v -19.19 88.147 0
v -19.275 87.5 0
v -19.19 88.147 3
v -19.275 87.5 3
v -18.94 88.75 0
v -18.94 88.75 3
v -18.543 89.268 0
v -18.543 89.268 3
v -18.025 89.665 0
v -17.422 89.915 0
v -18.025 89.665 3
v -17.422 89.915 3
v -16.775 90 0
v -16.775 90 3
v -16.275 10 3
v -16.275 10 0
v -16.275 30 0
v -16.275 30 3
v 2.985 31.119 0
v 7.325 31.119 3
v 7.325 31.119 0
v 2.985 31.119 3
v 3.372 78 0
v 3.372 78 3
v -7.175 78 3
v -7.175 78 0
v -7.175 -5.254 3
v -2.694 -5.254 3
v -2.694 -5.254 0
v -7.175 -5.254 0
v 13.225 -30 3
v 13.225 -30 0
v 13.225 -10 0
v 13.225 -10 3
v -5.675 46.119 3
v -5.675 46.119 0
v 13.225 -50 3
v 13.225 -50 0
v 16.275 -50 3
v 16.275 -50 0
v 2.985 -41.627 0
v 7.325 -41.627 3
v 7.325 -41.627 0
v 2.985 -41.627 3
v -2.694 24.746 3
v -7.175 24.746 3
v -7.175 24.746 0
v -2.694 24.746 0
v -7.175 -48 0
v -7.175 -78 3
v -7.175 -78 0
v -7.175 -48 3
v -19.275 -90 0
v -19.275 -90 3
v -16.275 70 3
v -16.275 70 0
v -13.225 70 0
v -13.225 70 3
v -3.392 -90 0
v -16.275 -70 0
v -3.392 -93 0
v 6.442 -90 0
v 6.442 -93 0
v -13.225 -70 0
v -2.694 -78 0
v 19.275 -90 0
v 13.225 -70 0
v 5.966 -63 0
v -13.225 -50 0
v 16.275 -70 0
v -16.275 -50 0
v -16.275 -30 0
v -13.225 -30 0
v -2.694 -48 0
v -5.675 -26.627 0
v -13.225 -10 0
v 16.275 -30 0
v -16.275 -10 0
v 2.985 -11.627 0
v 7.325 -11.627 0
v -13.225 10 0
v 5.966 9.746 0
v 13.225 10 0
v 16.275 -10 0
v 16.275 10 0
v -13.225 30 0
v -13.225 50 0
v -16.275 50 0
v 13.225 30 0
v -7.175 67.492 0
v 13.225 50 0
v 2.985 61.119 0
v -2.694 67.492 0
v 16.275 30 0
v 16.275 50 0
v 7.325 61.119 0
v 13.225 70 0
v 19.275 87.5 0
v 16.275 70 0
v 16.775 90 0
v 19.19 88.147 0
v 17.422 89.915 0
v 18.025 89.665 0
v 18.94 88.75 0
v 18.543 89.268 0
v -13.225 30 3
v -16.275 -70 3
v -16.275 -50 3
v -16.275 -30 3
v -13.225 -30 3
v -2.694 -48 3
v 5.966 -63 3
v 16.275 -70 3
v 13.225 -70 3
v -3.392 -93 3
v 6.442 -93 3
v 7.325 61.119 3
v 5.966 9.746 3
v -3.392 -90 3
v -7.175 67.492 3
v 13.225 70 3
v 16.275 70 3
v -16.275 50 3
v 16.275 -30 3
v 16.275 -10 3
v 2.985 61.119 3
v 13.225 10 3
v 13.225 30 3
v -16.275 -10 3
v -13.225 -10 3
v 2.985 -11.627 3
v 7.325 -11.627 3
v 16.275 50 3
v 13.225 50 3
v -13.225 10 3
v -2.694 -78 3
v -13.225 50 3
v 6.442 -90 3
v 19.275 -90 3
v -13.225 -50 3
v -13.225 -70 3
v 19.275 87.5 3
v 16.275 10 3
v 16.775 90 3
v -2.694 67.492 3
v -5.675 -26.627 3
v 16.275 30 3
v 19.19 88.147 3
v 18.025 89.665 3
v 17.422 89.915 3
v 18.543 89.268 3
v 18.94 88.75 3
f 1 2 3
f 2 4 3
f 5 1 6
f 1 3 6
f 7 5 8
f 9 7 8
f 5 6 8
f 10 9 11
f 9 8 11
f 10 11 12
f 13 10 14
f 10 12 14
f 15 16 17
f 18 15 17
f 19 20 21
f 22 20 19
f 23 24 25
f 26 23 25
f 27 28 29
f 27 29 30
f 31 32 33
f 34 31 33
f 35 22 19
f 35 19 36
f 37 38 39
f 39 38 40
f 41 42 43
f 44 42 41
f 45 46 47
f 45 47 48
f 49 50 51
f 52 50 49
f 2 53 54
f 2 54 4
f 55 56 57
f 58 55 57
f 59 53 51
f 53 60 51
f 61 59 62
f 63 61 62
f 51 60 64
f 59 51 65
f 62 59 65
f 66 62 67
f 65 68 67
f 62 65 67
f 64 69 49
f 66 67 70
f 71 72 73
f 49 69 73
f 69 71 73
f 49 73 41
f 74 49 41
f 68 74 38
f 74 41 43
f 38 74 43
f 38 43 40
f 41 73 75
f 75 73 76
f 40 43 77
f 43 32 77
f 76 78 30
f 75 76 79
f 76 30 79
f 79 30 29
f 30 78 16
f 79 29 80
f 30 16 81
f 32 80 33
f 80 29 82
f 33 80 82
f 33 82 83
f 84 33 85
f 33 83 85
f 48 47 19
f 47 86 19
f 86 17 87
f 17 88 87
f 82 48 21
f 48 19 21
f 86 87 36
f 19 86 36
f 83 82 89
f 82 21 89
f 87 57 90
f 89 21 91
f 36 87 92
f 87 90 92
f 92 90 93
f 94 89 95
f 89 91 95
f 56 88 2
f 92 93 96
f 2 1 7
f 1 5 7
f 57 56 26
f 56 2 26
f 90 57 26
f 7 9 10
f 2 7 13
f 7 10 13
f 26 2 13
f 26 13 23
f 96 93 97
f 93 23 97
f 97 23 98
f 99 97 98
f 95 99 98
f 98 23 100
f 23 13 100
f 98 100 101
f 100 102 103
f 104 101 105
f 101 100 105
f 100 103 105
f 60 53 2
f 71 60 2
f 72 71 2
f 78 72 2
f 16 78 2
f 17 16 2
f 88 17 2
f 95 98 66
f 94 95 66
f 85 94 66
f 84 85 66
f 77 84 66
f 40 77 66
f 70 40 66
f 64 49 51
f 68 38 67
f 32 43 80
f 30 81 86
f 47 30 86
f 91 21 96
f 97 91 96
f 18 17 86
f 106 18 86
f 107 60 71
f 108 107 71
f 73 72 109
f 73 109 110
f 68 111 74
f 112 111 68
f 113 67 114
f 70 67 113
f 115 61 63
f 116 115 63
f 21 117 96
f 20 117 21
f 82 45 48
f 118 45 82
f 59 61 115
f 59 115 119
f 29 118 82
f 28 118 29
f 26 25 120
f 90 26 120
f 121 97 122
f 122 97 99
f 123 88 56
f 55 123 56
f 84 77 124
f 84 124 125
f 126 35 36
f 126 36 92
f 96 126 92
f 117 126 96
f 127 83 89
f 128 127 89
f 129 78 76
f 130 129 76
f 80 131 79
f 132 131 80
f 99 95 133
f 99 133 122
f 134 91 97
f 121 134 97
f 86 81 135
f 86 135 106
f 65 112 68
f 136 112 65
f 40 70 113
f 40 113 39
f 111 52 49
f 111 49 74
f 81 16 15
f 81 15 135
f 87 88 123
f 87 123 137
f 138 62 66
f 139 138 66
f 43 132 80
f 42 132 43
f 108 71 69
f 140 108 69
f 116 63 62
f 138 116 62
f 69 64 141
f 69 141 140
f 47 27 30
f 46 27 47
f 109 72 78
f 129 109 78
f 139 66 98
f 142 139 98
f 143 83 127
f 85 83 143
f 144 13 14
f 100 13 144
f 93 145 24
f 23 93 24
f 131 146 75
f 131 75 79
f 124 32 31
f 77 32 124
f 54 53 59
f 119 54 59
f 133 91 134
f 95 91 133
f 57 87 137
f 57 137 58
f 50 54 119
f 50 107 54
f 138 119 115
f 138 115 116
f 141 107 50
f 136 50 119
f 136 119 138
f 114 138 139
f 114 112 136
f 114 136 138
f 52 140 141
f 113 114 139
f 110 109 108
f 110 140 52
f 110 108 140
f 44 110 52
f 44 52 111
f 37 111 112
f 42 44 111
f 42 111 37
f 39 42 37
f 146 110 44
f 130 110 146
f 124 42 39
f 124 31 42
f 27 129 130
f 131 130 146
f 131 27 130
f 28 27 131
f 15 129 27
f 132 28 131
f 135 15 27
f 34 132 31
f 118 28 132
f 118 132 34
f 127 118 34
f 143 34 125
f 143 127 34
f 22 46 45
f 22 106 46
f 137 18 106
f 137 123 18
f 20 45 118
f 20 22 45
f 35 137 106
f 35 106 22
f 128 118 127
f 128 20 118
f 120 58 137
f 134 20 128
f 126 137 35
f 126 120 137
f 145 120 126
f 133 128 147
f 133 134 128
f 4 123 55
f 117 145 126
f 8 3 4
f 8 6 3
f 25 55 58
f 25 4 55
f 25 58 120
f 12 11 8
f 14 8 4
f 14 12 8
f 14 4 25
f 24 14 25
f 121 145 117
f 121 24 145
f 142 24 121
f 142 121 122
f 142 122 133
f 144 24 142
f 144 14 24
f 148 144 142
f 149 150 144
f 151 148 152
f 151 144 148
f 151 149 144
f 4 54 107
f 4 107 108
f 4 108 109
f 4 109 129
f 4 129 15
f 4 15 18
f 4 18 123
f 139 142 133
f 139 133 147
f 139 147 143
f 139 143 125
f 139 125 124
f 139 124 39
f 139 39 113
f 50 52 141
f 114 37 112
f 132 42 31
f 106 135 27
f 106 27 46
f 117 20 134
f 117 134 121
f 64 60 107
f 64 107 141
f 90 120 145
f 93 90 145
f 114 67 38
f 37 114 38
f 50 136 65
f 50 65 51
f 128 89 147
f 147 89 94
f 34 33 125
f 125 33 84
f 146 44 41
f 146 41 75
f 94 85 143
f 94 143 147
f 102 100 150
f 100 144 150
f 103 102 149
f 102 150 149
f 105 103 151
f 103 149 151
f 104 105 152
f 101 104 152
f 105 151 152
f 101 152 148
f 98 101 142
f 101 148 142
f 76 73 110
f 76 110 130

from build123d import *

# Parameters (mm, degrees)
SKETCH1_W               = 38.55
SKETCH1_H               = 180
SKETCH1_W_2             = 3.05
SKETCH1_H_2             = 20
SKETCH1_W_3             = 9.833333334
SKETCH1_H_3             = 3
BOSS_EXTRUDE1_DEPTH     = 3
CUT_EXTRUDE4_DEPTH      = 1
CUT_EXTRUDE4_DEPTH_BACK = 4
FILLET1_R               = 2.5


with BuildPart() as part:
    # Sketch1 → Boss-Extrude1 (new body)
    with BuildSketch(Plane.XY):
        Rectangle(SKETCH1_W, SKETCH1_H)
        with Locations((14.75, -20)):
            Rectangle(SKETCH1_W_2, SKETCH1_H_2, mode=Mode.SUBTRACT)
        with Locations((14.75, 20)):
            Rectangle(SKETCH1_W_2, SKETCH1_H_2, mode=Mode.SUBTRACT)
        with Locations((14.75, 60)):
            Rectangle(SKETCH1_W_2, SKETCH1_H_2, mode=Mode.SUBTRACT)
        with Locations((14.75, -60)):
            Rectangle(SKETCH1_W_2, SKETCH1_H_2, mode=Mode.SUBTRACT)
        with Locations((-14.75, 60)):
            Rectangle(SKETCH1_W_2, SKETCH1_H_2, mode=Mode.SUBTRACT)
        with Locations((-14.75, 20)):
            Rectangle(SKETCH1_W_2, SKETCH1_H_2, mode=Mode.SUBTRACT)
        with Locations((-14.75, -20)):
            Rectangle(SKETCH1_W_2, SKETCH1_H_2, mode=Mode.SUBTRACT)
        with Locations((-14.75, -60)):
            Rectangle(SKETCH1_W_2, SKETCH1_H_2, mode=Mode.SUBTRACT)
        with Locations((1.525, -91.5)):
            Rectangle(SKETCH1_W_3, SKETCH1_H_3)
    extrude(amount=BOSS_EXTRUDE1_DEPTH)

    # Sketch3 → Cut-Extrude4 (cut, two sides)
    with BuildSketch(Plane.XY.offset(3)) as cut_extrude4_sk:
        Polygon((2.985254038, 31.119200877), (-5.675, 46.119200877), (2.985254038, 61.119200877), (7.325, 61.119200877), (7.325, 31.119200877), align=None)
        Polygon((2.985254038, -41.626933041), (-5.675, -26.626933041), (2.985254038, -11.626933041), (7.325, -11.626933041), (7.325, -41.626933041), align=None)
        Polygon((-7.175, 67.492267836), (-2.694237886, 67.492267836), (3.372404107, 78), (-7.175, 78), align=None)
        Polygon((-7.175, 24.746133918), (-2.694237886, 24.746133918), (5.966016151, 9.746133918), (-2.694237886, -5.253866082), (-7.175, -5.253866082), align=None)
        Polygon((-7.175, -78), (-7.175, -48), (-2.694237886, -48), (5.966016151, -63), (-2.694237886, -78), align=None)
    extrude(amount=CUT_EXTRUDE4_DEPTH, mode=Mode.SUBTRACT)
    extrude(cut_extrude4_sk.sketch, amount=-CUT_EXTRUDE4_DEPTH_BACK, mode=Mode.SUBTRACT)

    # Fillet1
    fillet1_edges = [part.edges().sort_by_distance(p)[0] for p in [
        (-19.275, 90, 1.5),
        (19.275, 90, 1.5),
    ]]
    fillet(fillet1_edges, radius=FILLET1_R)


solid = part.part
